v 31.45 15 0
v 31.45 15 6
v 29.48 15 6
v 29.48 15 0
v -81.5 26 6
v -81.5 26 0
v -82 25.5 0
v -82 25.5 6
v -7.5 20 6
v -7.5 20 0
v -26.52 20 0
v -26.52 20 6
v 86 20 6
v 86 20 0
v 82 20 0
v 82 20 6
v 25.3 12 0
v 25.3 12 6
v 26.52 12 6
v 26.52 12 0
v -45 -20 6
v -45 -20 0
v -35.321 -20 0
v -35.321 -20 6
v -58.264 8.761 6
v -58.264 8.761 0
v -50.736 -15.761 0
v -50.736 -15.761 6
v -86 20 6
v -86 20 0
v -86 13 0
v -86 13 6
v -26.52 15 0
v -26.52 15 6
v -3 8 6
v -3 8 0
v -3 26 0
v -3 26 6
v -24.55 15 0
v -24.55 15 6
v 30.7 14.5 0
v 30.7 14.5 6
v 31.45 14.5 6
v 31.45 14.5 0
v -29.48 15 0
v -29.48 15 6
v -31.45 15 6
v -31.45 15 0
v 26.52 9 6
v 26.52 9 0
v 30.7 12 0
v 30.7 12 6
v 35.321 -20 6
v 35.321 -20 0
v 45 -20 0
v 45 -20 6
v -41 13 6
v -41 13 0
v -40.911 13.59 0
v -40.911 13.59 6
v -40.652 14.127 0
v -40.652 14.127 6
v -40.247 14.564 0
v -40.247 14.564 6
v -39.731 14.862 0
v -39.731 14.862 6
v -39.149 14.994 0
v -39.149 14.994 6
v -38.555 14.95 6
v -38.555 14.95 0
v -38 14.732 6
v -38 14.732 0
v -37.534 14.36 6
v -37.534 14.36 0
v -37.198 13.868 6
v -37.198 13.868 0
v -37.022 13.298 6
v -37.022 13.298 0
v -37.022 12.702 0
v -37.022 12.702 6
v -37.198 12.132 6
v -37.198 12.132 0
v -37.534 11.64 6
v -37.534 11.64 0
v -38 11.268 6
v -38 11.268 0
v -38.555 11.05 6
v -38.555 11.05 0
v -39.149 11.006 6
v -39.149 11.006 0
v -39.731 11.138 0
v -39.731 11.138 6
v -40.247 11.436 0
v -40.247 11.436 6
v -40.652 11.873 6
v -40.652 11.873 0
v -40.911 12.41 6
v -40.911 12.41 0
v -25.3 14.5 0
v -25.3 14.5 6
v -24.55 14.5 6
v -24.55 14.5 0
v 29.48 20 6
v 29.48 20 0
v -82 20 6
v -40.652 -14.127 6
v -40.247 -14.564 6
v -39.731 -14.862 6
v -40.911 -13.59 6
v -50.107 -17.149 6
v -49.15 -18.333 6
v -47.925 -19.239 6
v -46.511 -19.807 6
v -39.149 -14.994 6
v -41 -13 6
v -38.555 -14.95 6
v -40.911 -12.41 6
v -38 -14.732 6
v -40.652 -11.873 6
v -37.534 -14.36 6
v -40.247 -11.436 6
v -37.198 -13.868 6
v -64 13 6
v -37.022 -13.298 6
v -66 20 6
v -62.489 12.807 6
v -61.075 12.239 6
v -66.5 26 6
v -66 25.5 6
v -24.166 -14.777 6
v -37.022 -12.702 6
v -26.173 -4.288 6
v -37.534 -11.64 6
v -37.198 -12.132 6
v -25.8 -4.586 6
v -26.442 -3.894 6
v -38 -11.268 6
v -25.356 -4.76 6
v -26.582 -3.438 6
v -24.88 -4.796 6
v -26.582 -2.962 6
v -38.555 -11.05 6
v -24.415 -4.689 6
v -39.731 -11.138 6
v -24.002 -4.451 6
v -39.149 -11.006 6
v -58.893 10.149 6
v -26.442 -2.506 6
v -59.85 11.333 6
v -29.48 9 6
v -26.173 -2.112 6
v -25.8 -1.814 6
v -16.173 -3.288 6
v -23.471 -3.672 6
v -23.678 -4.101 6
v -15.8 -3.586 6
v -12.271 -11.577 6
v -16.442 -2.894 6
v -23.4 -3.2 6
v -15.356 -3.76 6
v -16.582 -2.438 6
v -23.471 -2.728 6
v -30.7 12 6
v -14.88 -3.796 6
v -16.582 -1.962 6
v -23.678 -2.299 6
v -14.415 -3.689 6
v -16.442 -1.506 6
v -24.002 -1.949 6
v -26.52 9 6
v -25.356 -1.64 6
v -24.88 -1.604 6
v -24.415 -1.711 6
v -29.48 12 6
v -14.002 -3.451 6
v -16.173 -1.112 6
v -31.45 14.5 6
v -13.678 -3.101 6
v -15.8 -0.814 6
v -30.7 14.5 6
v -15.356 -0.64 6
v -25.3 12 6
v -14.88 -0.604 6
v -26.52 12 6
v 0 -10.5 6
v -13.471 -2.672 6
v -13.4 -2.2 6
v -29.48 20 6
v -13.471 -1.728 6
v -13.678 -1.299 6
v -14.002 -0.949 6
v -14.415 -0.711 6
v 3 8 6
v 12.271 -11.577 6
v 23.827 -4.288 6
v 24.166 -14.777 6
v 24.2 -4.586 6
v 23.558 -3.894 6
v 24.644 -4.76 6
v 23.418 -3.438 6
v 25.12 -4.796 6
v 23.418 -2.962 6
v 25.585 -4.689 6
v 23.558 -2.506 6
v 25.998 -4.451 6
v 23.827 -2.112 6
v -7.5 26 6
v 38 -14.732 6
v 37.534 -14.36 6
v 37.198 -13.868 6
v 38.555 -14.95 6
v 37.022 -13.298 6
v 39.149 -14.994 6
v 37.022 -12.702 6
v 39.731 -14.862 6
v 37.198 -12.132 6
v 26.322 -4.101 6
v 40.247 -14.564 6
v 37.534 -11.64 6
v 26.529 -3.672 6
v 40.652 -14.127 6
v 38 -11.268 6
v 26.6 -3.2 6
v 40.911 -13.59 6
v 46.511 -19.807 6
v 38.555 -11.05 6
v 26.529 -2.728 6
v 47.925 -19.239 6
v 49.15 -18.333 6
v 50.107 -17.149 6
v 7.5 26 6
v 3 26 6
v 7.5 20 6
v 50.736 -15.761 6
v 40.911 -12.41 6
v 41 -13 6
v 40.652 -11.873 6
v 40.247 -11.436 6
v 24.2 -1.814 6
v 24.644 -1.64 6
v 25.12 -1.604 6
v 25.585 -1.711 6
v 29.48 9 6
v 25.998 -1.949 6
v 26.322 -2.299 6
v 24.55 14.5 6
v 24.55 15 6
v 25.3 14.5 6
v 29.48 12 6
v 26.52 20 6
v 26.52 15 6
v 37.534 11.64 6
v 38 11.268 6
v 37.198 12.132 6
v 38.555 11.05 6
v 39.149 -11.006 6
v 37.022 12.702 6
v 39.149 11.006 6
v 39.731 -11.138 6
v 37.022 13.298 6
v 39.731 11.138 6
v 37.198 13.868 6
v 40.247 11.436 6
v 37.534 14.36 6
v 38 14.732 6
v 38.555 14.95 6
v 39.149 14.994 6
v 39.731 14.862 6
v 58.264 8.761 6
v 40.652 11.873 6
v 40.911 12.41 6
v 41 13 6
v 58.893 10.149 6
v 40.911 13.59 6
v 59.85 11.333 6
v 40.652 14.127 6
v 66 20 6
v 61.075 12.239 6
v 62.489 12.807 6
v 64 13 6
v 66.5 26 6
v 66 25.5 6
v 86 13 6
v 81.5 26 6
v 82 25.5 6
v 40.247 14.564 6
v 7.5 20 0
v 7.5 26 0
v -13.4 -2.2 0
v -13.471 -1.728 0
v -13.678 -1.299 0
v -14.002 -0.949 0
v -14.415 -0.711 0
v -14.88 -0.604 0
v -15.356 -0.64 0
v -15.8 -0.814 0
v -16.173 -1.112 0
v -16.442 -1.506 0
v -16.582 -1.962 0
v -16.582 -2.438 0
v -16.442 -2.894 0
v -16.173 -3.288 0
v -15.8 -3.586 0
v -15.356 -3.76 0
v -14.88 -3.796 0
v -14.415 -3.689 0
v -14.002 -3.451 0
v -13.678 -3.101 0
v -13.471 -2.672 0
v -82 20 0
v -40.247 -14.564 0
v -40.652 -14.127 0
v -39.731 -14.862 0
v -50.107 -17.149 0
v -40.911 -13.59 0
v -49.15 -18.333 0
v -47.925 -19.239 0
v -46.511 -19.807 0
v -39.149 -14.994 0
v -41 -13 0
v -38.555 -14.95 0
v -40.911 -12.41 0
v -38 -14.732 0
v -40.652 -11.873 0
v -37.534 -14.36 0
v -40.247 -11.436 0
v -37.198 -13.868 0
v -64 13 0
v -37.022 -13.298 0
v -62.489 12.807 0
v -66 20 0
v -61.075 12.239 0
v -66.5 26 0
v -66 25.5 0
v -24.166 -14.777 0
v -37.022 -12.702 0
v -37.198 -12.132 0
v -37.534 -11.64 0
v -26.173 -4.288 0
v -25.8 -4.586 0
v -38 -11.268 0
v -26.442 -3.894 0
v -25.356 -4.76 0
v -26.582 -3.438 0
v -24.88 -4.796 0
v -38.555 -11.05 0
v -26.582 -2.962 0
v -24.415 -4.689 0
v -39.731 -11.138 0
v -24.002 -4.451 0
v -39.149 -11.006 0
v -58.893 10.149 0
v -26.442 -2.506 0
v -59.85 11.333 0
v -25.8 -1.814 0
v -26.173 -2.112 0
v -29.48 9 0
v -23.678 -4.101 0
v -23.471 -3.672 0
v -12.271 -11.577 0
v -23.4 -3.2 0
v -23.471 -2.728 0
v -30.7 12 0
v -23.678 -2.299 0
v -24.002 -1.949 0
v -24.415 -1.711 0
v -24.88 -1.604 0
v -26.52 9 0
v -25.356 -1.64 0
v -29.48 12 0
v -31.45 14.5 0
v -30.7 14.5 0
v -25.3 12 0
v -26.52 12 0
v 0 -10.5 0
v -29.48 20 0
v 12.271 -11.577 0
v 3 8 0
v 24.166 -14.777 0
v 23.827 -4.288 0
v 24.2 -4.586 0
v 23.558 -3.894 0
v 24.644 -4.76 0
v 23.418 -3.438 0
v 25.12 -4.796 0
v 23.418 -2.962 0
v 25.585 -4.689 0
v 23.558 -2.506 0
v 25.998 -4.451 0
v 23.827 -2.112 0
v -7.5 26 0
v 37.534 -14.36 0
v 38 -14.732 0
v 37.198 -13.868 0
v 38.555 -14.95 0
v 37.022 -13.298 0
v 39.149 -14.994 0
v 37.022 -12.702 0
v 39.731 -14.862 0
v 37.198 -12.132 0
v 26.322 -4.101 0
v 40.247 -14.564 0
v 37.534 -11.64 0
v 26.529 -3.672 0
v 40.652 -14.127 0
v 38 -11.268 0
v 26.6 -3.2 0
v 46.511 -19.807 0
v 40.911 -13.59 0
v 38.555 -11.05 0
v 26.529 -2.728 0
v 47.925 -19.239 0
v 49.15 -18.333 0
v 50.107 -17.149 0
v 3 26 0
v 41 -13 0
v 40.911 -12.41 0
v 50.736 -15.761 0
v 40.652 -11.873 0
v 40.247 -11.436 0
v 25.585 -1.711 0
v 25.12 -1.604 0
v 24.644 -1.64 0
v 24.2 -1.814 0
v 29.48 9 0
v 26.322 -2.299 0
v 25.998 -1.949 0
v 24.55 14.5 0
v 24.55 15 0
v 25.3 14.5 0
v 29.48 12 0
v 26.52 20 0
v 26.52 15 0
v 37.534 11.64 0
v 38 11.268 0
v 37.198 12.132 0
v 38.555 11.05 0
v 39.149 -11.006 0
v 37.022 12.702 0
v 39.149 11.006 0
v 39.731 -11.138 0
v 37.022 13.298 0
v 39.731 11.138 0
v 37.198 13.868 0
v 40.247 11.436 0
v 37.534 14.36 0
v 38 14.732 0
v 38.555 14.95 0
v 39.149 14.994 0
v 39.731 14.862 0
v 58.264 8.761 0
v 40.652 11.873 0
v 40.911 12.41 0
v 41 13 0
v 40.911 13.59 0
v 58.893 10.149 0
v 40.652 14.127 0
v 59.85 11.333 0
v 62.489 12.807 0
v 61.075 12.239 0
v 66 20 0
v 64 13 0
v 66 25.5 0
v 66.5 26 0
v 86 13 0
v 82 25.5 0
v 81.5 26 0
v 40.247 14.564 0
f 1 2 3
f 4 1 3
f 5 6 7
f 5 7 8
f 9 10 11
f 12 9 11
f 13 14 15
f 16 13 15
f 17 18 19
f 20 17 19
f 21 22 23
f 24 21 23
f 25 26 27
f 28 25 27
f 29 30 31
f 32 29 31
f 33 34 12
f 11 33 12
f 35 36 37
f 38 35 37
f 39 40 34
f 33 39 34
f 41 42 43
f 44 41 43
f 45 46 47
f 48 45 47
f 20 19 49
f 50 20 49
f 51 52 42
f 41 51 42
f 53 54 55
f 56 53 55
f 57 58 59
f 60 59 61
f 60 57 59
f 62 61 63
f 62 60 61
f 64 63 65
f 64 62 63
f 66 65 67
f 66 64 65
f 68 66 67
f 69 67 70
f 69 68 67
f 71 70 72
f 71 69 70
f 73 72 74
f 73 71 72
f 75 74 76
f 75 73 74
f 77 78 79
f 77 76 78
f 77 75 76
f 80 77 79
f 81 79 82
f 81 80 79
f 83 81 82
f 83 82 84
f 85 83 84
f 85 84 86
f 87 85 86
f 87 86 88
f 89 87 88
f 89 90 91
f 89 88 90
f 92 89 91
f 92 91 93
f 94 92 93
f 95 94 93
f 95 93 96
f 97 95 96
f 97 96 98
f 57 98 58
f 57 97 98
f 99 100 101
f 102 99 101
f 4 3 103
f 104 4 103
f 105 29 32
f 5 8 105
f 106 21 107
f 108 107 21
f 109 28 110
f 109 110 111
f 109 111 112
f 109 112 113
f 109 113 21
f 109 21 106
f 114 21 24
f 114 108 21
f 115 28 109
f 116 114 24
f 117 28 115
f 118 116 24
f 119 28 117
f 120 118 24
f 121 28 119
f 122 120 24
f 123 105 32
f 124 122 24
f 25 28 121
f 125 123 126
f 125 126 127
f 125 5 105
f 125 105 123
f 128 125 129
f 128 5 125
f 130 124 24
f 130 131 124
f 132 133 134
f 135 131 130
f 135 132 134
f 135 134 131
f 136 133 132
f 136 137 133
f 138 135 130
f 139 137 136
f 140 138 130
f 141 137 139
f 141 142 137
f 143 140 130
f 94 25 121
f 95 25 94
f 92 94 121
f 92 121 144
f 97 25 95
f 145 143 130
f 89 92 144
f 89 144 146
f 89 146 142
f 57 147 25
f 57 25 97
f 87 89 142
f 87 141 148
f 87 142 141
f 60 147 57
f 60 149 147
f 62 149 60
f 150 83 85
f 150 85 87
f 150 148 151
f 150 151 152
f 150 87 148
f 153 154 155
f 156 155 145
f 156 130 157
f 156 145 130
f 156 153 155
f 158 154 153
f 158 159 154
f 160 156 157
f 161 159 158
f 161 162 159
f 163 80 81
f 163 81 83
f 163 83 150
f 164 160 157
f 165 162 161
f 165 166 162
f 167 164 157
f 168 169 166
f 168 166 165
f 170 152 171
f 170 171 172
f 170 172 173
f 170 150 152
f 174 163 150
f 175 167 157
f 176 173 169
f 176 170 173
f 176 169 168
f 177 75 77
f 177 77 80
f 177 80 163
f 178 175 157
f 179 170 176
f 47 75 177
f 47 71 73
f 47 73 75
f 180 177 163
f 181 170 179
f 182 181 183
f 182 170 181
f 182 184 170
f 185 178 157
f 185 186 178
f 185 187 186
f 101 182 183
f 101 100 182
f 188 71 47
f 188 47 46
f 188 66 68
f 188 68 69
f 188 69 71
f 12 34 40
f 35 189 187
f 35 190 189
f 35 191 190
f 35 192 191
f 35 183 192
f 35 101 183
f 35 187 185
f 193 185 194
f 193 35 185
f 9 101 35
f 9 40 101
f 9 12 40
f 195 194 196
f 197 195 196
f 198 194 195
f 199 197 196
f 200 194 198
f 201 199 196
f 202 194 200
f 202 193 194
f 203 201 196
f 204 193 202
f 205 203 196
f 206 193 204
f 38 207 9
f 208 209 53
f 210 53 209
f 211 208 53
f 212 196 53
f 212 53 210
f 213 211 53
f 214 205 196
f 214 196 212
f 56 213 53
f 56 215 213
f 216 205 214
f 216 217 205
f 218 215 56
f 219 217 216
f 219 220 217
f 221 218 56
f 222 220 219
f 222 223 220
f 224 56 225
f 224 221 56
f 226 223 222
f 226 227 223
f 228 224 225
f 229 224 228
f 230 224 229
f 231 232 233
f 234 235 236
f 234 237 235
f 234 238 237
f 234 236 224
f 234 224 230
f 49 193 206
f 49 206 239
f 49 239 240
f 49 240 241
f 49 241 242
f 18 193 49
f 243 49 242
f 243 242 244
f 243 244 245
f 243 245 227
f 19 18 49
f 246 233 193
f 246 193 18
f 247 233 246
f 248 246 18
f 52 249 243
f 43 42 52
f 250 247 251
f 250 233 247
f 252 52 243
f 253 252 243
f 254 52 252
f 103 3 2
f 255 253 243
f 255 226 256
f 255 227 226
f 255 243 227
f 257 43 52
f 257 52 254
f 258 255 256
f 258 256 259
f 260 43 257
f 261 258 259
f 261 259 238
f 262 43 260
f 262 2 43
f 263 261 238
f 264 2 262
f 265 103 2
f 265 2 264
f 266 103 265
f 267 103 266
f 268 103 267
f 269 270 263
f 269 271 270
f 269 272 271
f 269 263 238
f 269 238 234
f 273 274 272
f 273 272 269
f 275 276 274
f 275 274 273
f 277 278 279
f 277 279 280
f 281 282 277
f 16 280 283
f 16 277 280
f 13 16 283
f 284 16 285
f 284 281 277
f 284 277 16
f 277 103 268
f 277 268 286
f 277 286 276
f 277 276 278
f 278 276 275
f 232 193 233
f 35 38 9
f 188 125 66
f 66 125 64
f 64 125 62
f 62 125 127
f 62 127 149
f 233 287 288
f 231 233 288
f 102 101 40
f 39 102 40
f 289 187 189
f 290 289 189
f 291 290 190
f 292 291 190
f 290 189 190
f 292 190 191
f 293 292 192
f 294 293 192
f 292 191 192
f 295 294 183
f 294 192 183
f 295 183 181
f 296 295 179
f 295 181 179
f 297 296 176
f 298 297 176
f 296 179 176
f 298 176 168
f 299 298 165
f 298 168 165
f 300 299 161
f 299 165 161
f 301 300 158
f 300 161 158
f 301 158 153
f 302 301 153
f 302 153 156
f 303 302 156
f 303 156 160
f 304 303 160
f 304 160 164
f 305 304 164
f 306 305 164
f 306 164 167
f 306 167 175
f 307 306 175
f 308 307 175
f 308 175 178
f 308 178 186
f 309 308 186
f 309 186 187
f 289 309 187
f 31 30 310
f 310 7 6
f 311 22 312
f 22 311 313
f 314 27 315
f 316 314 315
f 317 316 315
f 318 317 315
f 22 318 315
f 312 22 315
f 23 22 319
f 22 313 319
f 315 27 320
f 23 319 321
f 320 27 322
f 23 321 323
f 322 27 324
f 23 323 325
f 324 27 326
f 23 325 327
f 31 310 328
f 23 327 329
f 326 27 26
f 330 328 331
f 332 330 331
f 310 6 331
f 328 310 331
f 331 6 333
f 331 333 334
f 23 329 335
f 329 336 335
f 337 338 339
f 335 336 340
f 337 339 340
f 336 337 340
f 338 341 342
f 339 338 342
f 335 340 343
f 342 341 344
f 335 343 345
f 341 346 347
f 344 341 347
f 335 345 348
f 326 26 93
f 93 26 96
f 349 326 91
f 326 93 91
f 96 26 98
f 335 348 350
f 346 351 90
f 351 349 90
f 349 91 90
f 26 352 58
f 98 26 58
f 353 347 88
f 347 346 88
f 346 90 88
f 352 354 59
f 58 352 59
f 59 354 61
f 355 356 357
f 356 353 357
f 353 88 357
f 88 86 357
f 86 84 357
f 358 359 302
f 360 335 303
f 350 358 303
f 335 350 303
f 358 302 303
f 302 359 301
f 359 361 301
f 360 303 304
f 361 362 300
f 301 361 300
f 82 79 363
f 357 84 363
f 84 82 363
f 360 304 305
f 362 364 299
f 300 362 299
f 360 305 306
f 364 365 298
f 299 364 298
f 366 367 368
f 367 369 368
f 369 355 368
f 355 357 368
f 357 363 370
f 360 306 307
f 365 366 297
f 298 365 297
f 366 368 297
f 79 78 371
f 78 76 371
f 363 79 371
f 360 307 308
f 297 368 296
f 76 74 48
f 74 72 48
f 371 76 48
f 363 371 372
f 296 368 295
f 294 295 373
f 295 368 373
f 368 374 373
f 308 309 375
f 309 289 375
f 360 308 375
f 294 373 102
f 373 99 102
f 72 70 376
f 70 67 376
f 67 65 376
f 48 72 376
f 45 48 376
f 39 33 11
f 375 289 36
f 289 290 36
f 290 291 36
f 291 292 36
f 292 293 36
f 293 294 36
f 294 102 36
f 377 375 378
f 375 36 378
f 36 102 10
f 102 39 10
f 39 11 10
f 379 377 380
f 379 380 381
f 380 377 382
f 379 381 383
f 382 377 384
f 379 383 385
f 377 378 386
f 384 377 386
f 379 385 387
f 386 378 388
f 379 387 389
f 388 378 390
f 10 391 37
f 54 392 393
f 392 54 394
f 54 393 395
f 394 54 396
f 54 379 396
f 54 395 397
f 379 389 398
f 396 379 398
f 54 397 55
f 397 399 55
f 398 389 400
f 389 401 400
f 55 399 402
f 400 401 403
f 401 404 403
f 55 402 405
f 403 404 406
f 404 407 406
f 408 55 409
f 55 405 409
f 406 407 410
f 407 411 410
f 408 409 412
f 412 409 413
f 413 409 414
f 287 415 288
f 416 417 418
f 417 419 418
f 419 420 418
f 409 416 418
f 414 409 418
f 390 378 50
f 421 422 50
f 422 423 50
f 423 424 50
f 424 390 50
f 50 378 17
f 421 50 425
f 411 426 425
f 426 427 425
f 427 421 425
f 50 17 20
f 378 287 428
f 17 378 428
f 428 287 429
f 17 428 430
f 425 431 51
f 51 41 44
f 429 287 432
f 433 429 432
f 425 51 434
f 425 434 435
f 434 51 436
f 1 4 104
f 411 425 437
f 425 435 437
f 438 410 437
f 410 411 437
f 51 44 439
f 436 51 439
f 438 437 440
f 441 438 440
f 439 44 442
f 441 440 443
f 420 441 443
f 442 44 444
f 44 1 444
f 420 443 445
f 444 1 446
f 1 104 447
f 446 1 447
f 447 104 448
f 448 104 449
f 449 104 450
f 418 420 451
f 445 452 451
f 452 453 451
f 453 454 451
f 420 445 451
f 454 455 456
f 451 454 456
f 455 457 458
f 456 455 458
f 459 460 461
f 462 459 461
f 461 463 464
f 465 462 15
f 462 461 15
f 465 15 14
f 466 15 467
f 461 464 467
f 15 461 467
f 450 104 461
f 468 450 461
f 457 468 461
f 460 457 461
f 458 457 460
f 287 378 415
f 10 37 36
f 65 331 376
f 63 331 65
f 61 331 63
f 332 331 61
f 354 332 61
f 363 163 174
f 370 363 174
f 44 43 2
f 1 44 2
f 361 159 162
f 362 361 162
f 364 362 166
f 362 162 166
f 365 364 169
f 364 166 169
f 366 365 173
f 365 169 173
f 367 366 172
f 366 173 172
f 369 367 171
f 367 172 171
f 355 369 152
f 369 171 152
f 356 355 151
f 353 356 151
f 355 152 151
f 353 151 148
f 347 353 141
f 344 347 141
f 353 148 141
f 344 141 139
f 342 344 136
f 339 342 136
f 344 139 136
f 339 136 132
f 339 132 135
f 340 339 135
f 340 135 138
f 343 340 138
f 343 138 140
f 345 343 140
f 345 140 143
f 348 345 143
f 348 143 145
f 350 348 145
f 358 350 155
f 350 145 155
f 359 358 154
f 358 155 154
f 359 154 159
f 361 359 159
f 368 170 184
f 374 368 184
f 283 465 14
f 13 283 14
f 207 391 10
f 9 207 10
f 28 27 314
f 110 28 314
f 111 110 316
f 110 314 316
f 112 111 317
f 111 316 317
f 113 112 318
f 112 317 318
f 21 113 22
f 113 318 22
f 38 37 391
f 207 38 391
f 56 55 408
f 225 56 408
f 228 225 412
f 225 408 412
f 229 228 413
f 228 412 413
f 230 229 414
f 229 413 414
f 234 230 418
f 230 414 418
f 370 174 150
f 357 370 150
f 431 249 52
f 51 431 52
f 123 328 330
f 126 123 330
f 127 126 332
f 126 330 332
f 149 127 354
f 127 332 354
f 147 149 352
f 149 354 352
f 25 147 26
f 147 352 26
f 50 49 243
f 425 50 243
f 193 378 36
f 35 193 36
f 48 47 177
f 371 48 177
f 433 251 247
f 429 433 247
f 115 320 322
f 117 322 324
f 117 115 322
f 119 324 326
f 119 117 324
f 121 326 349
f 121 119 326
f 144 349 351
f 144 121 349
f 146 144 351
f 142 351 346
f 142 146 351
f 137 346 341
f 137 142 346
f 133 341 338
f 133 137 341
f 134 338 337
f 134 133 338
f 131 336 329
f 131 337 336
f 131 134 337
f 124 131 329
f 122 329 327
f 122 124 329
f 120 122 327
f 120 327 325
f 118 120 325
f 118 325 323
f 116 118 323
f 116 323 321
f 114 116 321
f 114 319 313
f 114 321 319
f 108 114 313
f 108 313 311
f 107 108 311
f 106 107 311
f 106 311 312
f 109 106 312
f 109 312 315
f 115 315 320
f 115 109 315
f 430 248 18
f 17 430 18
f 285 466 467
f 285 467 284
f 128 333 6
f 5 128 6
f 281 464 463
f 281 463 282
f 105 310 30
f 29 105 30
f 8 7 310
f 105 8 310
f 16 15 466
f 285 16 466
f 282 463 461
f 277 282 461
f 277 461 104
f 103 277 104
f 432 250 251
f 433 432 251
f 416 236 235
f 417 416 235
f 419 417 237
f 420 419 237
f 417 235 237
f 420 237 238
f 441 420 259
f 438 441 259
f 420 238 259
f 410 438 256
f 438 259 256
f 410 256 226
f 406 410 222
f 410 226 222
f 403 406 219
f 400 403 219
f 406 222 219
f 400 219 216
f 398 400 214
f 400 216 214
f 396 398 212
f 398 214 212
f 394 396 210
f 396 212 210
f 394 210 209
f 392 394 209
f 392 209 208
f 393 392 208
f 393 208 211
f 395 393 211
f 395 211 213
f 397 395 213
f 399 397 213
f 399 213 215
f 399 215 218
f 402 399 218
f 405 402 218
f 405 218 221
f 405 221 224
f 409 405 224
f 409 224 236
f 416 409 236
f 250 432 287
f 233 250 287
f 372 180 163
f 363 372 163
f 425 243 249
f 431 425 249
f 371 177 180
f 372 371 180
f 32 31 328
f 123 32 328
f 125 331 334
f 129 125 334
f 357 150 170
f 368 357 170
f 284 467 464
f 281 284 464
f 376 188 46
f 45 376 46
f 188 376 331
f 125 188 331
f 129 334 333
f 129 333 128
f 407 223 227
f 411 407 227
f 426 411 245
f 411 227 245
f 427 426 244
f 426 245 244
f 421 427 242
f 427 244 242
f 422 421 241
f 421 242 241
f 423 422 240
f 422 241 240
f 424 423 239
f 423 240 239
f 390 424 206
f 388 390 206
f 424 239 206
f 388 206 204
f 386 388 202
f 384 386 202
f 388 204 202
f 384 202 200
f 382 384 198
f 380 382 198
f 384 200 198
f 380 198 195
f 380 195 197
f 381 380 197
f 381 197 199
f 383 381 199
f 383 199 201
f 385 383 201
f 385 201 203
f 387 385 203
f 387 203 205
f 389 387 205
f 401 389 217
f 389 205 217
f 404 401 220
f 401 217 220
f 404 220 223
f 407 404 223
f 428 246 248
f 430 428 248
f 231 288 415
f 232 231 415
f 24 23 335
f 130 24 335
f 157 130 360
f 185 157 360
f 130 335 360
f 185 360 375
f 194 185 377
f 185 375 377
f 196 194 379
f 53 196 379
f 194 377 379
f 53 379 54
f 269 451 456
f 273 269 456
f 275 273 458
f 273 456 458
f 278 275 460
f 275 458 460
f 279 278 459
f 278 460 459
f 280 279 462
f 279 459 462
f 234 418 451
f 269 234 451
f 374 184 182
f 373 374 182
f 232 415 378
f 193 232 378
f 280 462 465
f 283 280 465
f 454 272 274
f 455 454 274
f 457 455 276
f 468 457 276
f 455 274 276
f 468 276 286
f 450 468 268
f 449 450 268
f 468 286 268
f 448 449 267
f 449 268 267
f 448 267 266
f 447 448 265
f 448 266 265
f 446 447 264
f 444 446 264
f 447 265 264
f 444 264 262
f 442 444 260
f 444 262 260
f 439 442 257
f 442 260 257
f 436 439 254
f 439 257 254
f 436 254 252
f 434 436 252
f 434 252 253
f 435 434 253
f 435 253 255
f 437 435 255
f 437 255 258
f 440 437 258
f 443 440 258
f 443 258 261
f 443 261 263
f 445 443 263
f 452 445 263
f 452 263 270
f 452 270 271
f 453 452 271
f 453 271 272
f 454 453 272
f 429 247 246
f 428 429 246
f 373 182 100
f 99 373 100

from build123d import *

# Parameters (mm, degrees)
BOSS_EXTRUDE1_DEPTH = 6
SKETCH2_R           = 2
SKETCH2_R_2         = 1.6
CUT_EXTRUDE1_DEPTH  = 7
CHAMFER1_SIZE       = 0.5
CUT_EXTRUDE2_DEPTH  = 7
SKETCH5_R           = 1.6
CUT_EXTRUDE3_DEPTH  = 7


with BuildPart() as part:
    # Sketch1 → Boss-Extrude1 (new body)
    with BuildSketch(Plane.XY):
        with BuildLine():
            Line((-7.5, 20), (-66, 20))
            Line((-66, 20), (-66, 26))
            Line((-66, 26), (-82, 26))
            Line((-82, 26), (-82, 20))
            Line((-82, 20), (-86, 20))
            Line((-86, 20), (-86, 13))
            Line((-86, 13), (-64, 13))
            ThreePointArc((-64, 13), (-60.433883594, 11.825226811), (-58.264226502, 8.760937927))
            Line((-58.264226502, 8.760937927), (-50.735773498, -15.760937927))
            ThreePointArc((-50.735773498, -15.760937927), (-48.566116406, -18.825226811), (-45, -20))
            Line((-45, -20), (-35.321388767, -20))
            ThreePointArc((-35.321388767, -20), (0, -10.5), (35.321388767, -20))
            Line((35.321388767, -20), (45, -20))
            ThreePointArc((45, -20), (48.566116406, -18.825226811), (50.735773498, -15.760937927))
            Line((50.735773498, -15.760937927), (58.264226502, 8.760937927))
            ThreePointArc((58.264226502, 8.760937927), (60.433883594, 11.825226811), (64, 13))
            Line((64, 13), (86, 13))
            Line((86, 13), (86, 20))
            Line((86, 20), (82, 20))
            Line((82, 20), (82, 26))
            Line((82, 26), (66, 26))
            Line((66, 26), (66, 20))
            Line((66, 20), (7.5, 20))
            Line((7.5, 20), (7.5, 26))
            Line((7.5, 26), (3, 26))
            Line((3, 26), (3, 8))
            Line((3, 8), (-3, 8))
            Line((-3, 8), (-3, 26))
            Line((-3, 26), (-7.5, 26))
            Line((-7.5, 26), (-7.5, 20))
        make_face()
    extrude(amount=BOSS_EXTRUDE1_DEPTH)

    # Sketch2 → Cut-Extrude1 (cut, through all)
    with BuildSketch(Plane.XY.offset(6)):
        with Locations((39, -13)):
            Circle(SKETCH2_R)
        with Locations((39, 13)):
            Circle(SKETCH2_R)
        with Locations((25, -3.2)):
            Circle(SKETCH2_R_2)
        with Locations((-25, -3.2)):
            Circle(SKETCH2_R_2)
    cut_extrude1 = extrude(amount=-CUT_EXTRUDE1_DEPTH, mode=Mode.SUBTRACT)

    # Mirror1: Cut-Extrude1 across plane
    add(cut_extrude1.mirror(Plane(origin=(0, 0, 0), x_dir=(0, 0, 1), z_dir=(1, 0, 0))), mode=Mode.SUBTRACT)

    # Chamfer1
    chamfer1_edges = [part.edges().sort_by_distance(p)[0] for p in [
        (66, 26, 3),
        (82, 26, 3),
        (-82, 26, 3),
        (-66, 26, 3),
    ]]
    chamfer(chamfer1_edges, length=CHAMFER1_SIZE)

    # Sketch4 → Cut-Extrude2 (cut, through all)
    with BuildSketch(Plane.XY.offset(6)):
        Polygon((-29.48, 20), (-29.48, 15), (-31.45, 15), (-31.45, 14.5), (-30.7, 14.5), (-30.7, 12), (-29.48, 12), (-29.48, 9), (-26.52, 9), (-26.52, 12), (-25.3, 12), (-25.3, 14.5), (-24.55, 14.5), (-24.55, 15), (-26.52, 15), (-26.52, 20), align=None)
        Polygon((26.52, 20), (26.52, 15), (24.55, 15), (24.55, 14.5), (25.3, 14.5), (25.3, 12), (26.52, 12), (26.52, 9), (29.48, 9), (29.48, 12), (30.7, 12), (30.7, 14.5), (31.45, 14.5), (31.45, 15), (29.48, 15), (29.48, 20), align=None)
    extrude(amount=-CUT_EXTRUDE2_DEPTH, mode=Mode.SUBTRACT)

    # Sketch5 → Cut-Extrude3 (cut, through all)
    with BuildSketch(Plane.XY.offset(6)):
        with Locations((-15, -2.2)):
            Circle(SKETCH5_R)
    extrude(amount=-CUT_EXTRUDE3_DEPTH, mode=Mode.SUBTRACT)


solid = part.part
